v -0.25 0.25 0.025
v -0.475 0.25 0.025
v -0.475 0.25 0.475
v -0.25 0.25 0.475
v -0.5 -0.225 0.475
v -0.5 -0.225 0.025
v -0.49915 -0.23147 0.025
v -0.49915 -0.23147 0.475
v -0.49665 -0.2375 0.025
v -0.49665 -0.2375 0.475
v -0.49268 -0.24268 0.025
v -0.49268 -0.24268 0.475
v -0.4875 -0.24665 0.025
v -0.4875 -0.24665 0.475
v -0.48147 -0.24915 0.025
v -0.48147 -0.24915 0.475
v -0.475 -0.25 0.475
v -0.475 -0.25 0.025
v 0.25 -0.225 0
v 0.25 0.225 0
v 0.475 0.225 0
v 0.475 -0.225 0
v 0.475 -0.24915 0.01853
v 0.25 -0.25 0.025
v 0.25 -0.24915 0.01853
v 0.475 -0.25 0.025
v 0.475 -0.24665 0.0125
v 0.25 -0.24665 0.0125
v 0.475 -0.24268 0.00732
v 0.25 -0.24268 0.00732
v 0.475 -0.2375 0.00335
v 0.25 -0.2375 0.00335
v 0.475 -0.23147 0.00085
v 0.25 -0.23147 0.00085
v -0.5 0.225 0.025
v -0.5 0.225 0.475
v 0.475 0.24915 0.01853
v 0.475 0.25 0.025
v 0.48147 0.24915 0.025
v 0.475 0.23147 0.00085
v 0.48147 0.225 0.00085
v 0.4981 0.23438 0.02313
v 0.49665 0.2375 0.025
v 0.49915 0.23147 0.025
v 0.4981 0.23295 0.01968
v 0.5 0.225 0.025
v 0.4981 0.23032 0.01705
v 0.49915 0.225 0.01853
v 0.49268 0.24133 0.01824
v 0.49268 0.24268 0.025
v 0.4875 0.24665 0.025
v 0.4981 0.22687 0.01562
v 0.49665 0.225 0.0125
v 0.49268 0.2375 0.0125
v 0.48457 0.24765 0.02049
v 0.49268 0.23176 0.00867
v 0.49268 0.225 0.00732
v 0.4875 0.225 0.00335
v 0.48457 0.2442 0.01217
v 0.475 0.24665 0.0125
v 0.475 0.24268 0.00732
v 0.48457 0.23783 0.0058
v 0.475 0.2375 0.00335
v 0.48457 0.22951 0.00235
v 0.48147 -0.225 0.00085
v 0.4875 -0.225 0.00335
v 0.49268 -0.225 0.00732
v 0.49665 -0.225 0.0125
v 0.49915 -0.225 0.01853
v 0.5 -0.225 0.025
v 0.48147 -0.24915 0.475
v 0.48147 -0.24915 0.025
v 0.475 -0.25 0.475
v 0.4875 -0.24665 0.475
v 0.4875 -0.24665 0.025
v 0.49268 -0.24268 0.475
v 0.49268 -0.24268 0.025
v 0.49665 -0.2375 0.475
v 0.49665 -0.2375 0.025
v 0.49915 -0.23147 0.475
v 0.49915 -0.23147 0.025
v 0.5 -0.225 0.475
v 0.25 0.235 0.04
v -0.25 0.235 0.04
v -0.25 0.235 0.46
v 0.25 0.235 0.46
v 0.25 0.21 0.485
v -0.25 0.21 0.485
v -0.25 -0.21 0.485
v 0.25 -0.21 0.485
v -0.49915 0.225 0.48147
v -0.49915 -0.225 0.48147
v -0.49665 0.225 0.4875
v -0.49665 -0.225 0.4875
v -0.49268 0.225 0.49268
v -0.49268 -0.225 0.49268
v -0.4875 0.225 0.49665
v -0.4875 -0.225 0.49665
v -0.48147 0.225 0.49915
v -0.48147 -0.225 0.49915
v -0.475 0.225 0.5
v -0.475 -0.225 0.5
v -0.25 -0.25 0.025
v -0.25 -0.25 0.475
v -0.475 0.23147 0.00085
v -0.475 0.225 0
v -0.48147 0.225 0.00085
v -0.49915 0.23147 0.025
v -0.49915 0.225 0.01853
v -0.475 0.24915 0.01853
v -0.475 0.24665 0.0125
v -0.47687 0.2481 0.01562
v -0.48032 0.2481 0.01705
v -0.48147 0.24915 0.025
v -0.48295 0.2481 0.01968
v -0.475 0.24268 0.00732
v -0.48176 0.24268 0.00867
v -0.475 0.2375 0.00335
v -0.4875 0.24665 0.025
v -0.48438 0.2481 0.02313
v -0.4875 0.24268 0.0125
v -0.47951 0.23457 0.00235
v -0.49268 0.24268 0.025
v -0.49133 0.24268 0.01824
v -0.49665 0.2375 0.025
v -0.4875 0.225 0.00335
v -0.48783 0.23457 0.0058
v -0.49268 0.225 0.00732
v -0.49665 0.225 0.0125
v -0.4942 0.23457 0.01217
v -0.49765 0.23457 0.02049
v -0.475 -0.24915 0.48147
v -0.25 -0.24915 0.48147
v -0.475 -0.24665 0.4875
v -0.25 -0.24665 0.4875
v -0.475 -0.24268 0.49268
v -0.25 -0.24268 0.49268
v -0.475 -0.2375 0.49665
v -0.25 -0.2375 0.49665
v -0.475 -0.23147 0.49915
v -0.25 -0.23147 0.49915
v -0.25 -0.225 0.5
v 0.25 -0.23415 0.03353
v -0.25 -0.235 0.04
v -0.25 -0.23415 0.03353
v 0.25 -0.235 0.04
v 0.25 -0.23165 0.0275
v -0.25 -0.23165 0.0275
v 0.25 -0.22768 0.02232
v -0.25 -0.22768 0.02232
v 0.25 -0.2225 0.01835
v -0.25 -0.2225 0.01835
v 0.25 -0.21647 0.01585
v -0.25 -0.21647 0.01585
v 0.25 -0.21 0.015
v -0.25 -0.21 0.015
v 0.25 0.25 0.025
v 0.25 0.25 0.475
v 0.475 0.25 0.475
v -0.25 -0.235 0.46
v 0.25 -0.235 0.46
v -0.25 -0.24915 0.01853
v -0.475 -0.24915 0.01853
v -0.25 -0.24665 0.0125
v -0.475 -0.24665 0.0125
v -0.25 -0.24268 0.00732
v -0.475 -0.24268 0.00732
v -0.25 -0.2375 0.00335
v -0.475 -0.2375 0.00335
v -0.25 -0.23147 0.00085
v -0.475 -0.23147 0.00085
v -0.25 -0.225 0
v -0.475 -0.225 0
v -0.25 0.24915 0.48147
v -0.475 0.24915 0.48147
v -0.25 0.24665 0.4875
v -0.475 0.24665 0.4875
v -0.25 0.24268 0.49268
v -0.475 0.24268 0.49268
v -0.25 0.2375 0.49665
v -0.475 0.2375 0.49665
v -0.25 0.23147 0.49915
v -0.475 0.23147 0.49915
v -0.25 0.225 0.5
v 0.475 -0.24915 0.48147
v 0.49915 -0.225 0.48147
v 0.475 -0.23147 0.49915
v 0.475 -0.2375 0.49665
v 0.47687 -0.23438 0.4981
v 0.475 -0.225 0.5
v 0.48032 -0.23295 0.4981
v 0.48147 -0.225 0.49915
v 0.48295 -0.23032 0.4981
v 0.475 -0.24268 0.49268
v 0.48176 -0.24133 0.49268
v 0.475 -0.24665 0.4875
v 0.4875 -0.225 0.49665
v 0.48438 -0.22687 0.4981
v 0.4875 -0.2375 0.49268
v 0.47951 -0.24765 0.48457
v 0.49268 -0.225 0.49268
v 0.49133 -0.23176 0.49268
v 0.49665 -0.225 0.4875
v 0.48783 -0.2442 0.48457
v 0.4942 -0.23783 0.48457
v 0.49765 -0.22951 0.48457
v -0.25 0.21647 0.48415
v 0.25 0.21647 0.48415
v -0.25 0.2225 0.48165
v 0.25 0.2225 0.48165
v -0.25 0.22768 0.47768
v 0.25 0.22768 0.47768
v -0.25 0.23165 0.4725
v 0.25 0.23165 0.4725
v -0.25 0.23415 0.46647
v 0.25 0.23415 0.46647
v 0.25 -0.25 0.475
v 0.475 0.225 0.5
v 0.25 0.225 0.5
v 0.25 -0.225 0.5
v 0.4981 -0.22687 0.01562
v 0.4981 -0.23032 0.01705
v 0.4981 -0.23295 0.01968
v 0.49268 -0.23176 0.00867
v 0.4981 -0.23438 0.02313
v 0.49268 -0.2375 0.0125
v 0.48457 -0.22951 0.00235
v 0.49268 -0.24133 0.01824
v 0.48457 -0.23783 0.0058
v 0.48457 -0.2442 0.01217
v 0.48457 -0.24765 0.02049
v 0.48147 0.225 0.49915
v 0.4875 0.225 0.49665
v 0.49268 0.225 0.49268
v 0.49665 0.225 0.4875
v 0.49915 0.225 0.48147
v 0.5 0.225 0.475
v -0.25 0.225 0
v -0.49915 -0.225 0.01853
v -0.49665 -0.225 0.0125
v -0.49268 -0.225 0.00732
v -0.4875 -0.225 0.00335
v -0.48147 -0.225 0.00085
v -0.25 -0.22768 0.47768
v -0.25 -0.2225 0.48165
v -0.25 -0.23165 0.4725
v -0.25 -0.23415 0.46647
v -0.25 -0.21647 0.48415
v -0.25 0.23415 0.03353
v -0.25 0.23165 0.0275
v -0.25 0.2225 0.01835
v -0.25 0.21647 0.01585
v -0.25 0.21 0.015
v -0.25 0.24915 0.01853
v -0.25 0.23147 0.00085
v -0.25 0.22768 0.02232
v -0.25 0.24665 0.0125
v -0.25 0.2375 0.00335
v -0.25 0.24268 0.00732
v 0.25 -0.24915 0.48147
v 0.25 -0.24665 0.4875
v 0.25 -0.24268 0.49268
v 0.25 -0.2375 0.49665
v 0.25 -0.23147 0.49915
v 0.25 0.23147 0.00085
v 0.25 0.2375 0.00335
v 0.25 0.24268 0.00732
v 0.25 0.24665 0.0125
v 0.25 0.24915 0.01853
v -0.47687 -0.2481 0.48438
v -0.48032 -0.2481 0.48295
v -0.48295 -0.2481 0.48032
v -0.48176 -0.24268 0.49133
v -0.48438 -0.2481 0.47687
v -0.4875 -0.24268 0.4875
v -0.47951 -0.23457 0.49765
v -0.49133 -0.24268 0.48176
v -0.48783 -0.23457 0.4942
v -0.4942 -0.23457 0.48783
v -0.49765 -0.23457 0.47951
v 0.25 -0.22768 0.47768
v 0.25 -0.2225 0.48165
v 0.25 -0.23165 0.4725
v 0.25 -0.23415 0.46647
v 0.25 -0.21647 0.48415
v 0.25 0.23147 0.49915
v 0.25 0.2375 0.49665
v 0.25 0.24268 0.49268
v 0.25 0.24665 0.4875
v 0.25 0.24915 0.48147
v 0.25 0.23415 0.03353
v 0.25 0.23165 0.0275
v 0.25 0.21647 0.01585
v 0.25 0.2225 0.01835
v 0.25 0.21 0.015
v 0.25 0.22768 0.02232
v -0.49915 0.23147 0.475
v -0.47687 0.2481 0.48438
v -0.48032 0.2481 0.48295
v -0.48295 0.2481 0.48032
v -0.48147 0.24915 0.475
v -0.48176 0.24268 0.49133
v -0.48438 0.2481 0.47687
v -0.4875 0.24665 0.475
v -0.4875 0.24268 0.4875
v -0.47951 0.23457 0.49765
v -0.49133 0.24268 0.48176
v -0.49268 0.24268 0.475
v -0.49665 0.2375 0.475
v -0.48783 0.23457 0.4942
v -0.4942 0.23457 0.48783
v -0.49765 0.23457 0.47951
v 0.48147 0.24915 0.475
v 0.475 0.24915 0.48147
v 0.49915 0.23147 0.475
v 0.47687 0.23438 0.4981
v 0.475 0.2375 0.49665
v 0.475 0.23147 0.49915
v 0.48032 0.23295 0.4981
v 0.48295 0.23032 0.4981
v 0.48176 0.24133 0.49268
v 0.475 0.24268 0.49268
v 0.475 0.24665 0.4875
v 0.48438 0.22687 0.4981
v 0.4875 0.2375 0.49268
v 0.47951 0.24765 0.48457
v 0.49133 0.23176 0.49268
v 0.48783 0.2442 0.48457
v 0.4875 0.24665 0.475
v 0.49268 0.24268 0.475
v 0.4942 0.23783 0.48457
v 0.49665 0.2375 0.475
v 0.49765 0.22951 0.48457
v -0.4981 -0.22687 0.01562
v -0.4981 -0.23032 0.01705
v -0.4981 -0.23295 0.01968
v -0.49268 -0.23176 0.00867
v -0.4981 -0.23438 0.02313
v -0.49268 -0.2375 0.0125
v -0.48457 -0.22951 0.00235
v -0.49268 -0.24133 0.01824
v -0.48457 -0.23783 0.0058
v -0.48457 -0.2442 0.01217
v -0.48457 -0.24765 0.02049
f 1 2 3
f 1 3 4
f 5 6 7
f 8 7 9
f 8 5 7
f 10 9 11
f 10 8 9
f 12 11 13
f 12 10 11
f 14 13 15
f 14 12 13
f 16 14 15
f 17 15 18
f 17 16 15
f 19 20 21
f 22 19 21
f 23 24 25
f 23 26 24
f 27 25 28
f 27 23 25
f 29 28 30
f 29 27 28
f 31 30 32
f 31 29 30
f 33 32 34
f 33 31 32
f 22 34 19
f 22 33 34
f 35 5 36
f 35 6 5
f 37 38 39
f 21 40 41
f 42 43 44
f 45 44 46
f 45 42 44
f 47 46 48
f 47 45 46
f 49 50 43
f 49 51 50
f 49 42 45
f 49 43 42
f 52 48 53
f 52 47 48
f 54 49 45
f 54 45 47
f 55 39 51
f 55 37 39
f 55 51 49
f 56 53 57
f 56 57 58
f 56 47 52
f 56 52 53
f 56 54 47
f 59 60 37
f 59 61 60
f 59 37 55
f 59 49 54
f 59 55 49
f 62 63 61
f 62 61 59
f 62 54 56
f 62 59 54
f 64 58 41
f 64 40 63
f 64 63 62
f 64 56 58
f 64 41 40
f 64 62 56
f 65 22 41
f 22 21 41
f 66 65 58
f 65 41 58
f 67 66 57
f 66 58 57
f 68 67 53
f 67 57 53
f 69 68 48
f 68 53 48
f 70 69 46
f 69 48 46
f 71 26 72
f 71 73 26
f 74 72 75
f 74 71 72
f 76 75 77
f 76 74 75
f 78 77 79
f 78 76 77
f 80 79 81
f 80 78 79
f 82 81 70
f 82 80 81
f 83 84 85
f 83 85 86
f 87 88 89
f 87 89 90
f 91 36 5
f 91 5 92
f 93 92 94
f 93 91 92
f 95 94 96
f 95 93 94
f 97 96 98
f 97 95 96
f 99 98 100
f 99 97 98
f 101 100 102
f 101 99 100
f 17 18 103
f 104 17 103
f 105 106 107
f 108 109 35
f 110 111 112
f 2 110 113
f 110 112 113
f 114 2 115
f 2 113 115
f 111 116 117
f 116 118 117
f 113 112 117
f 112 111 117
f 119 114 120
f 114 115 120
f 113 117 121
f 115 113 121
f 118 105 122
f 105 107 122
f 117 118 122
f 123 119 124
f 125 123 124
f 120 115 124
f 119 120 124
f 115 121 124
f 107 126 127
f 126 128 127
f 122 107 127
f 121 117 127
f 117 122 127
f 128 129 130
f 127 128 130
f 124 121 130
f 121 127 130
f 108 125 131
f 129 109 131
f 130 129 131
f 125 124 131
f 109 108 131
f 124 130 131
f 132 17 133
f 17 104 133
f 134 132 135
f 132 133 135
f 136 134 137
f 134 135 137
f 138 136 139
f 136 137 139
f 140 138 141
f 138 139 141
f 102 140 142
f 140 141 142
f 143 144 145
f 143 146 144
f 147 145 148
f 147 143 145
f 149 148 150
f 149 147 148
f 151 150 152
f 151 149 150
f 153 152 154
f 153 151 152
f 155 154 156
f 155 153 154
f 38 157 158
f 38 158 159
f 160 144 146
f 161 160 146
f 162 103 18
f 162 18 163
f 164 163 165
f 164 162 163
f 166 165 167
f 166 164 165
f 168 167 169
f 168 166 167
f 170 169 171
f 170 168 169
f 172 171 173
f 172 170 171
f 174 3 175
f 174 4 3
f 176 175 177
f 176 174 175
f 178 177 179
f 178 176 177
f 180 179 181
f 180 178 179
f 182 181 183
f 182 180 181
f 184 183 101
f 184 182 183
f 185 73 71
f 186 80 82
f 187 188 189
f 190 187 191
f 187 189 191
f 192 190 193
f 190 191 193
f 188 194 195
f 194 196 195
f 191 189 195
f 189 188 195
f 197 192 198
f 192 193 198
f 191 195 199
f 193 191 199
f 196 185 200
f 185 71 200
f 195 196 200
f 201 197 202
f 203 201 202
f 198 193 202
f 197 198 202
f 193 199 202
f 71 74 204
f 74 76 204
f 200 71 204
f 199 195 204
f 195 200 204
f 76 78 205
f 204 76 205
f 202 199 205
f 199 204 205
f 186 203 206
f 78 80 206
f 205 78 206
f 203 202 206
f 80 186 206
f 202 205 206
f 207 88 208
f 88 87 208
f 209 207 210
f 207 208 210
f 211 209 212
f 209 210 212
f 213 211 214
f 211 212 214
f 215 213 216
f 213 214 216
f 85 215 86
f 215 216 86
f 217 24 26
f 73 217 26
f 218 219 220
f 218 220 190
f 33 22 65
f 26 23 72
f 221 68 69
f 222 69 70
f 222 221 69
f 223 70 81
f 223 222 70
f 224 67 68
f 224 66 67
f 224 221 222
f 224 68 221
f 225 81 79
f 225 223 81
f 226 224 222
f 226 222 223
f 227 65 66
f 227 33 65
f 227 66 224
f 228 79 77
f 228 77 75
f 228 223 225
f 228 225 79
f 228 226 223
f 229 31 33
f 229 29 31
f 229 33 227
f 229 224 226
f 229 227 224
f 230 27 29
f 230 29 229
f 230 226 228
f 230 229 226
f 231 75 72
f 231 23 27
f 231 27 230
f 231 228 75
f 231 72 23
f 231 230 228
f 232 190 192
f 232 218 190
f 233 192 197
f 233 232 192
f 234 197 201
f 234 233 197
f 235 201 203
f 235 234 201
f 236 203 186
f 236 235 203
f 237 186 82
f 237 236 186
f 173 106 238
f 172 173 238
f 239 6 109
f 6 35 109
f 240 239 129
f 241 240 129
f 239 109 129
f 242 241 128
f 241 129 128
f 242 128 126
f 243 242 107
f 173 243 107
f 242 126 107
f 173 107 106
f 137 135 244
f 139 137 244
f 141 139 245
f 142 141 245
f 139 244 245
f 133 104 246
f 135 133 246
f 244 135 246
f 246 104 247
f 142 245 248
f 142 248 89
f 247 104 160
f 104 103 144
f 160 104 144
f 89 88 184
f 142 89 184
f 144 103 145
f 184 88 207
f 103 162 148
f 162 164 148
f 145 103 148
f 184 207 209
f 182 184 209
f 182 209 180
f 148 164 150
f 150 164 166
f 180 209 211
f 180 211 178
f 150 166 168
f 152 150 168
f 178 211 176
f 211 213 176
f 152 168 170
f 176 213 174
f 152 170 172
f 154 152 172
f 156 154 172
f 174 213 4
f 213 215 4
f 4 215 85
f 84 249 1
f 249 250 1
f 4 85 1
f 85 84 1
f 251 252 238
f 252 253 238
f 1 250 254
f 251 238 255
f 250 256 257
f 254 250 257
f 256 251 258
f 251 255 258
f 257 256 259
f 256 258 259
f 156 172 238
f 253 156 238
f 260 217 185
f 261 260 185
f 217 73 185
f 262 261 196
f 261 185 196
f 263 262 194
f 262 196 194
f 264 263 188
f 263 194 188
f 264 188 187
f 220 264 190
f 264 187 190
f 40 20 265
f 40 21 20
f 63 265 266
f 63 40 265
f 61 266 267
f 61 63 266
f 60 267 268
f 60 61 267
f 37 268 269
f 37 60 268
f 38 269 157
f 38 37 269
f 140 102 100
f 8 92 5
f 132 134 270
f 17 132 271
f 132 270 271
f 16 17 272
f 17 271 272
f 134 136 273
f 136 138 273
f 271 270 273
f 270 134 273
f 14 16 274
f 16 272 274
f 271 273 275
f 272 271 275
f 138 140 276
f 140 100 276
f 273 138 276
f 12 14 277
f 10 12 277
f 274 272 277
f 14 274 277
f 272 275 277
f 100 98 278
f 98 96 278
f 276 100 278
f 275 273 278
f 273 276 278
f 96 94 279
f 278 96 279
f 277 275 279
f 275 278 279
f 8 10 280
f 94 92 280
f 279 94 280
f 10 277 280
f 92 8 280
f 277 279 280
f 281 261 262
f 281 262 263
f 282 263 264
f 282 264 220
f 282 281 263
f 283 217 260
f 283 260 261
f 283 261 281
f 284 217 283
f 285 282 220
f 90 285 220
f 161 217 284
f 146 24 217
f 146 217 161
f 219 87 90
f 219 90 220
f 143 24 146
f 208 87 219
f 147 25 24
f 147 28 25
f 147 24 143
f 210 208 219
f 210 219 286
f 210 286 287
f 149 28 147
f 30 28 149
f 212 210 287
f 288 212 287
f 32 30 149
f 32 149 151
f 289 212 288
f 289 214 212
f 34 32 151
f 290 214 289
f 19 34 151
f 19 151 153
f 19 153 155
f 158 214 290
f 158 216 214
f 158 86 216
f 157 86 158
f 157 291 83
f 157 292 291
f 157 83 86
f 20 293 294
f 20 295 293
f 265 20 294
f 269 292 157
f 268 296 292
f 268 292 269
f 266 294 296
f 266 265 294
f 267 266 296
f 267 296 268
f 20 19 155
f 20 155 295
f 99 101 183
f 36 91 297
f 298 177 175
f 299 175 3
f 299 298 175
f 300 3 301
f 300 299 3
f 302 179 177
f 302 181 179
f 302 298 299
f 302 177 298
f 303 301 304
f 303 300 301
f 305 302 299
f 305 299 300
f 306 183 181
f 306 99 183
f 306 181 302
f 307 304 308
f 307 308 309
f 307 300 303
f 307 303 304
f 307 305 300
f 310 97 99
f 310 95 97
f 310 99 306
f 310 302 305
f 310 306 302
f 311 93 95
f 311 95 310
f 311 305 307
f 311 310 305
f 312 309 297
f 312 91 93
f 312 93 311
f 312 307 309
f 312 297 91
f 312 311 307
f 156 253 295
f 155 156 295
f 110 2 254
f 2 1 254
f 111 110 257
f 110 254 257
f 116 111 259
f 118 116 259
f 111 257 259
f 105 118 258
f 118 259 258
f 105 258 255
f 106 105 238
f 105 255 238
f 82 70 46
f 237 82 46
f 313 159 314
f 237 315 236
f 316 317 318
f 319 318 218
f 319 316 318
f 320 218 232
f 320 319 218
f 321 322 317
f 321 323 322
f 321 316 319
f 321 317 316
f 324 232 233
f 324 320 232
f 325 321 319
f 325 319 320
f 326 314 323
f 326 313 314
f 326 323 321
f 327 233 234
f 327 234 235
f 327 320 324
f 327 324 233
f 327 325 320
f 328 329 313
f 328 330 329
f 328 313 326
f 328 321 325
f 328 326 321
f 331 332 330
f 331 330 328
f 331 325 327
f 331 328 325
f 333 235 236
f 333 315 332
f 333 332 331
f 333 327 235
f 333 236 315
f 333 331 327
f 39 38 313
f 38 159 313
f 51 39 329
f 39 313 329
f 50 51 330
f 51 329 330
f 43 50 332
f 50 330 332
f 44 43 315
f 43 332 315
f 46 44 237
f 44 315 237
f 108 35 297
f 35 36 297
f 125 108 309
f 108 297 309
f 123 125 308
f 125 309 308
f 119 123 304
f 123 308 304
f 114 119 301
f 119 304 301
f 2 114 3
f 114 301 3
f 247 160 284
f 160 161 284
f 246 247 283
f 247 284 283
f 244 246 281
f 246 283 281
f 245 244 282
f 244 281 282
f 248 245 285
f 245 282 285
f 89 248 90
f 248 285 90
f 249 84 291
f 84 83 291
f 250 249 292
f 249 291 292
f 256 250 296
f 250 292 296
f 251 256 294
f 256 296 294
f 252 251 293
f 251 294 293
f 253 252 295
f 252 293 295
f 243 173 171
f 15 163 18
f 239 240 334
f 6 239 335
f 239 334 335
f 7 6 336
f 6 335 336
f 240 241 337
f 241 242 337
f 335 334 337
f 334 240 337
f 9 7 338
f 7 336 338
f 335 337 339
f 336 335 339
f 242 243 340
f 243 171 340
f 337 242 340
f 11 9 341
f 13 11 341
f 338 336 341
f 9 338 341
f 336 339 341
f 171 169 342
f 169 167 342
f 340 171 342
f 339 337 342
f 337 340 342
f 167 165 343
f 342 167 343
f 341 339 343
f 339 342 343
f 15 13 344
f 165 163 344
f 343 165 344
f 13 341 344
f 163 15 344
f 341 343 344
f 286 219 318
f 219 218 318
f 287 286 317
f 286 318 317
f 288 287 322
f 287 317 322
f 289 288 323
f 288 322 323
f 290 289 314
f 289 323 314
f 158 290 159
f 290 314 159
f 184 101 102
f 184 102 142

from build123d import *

# Parameters (mm, degrees)
SKETCH_3_W        = 0.25
SKETCH_3_H        = 0.5
EXTRUDE_3_DEPTH   = 0.5
EXTRUDE_3_2_DEPTH = 0.5
EXTRUDE_START     = 0.015
SKETCH_4_W        = 0.5
SKETCH_4_H        = 0.47
EXTRUDE_3_3_DEPTH = 0.47
FILLET_2_R        = 0.025
FILLET_3_R        = 0.025


with BuildPart() as part:
    # Эскиз3 → Extrude 3 (new body)
    with BuildSketch(Plane.XY):
        with Locations((0.375, 0)):
            Rectangle(SKETCH_3_W, SKETCH_3_H)
    extrude(amount=EXTRUDE_3_DEPTH)



with BuildPart() as body_2:
    # Эскиз3 → Extrude 3 2 (new body)
    with BuildSketch(Plane.XY):
        with Locations((-0.375, 0)):
            Rectangle(SKETCH_3_W, SKETCH_3_H)
    extrude(amount=EXTRUDE_3_2_DEPTH)


with BuildPart() as part_1:
    add(part.part)

    add(body_2.part)  # Extrude 3 3 merges body 2
    # Эскиз4 → Extrude 3 3 (add)
    with BuildSketch(Plane.XY.offset(EXTRUDE_START)):
        Rectangle(SKETCH_4_W, SKETCH_4_H)
    extrude(amount=EXTRUDE_3_3_DEPTH)

    # Скругление2
    fillet_2_edges = [part_1.edges().sort_by_distance(p)[0] for p in [
        (-0.5, 0, 0.5),
        (-0.375, -0.25, 0.5),
        (0.375, 0.25, 0),
        (0.5, 0.25, 0.25),
        (0.375, -0.25, 0),
        (0.5, 0, 0),
        (0.5, -0.25, 0.25),
        (0.375, 0.25, 0.5),
        (0.375, -0.25, 0.5),
        (0.5, 0, 0.5),
        (-0.375, -0.25, 0),
        (-0.5, 0, 0),
        (-0.375, 0.25, 0),
        (-0.375, 0.25, 0.5),
        (-0.5, -0.25, 0.25),
        (-0.5, 0.25, 0.25),
    ]]
    fillet(fillet_2_edges, radius=FILLET_2_R)

    # Скругление3
    fillet_3_edges = [part_1.edges().sort_by_distance(p)[0] for p in [
        (0, -0.235, 0.015),
        (0, 0.235, 0.015),
        (0, 0.235, 0.485),
        (0, -0.235, 0.485),
    ]]
    fillet(fillet_3_edges, radius=FILLET_3_R)


solid = part_1.part
